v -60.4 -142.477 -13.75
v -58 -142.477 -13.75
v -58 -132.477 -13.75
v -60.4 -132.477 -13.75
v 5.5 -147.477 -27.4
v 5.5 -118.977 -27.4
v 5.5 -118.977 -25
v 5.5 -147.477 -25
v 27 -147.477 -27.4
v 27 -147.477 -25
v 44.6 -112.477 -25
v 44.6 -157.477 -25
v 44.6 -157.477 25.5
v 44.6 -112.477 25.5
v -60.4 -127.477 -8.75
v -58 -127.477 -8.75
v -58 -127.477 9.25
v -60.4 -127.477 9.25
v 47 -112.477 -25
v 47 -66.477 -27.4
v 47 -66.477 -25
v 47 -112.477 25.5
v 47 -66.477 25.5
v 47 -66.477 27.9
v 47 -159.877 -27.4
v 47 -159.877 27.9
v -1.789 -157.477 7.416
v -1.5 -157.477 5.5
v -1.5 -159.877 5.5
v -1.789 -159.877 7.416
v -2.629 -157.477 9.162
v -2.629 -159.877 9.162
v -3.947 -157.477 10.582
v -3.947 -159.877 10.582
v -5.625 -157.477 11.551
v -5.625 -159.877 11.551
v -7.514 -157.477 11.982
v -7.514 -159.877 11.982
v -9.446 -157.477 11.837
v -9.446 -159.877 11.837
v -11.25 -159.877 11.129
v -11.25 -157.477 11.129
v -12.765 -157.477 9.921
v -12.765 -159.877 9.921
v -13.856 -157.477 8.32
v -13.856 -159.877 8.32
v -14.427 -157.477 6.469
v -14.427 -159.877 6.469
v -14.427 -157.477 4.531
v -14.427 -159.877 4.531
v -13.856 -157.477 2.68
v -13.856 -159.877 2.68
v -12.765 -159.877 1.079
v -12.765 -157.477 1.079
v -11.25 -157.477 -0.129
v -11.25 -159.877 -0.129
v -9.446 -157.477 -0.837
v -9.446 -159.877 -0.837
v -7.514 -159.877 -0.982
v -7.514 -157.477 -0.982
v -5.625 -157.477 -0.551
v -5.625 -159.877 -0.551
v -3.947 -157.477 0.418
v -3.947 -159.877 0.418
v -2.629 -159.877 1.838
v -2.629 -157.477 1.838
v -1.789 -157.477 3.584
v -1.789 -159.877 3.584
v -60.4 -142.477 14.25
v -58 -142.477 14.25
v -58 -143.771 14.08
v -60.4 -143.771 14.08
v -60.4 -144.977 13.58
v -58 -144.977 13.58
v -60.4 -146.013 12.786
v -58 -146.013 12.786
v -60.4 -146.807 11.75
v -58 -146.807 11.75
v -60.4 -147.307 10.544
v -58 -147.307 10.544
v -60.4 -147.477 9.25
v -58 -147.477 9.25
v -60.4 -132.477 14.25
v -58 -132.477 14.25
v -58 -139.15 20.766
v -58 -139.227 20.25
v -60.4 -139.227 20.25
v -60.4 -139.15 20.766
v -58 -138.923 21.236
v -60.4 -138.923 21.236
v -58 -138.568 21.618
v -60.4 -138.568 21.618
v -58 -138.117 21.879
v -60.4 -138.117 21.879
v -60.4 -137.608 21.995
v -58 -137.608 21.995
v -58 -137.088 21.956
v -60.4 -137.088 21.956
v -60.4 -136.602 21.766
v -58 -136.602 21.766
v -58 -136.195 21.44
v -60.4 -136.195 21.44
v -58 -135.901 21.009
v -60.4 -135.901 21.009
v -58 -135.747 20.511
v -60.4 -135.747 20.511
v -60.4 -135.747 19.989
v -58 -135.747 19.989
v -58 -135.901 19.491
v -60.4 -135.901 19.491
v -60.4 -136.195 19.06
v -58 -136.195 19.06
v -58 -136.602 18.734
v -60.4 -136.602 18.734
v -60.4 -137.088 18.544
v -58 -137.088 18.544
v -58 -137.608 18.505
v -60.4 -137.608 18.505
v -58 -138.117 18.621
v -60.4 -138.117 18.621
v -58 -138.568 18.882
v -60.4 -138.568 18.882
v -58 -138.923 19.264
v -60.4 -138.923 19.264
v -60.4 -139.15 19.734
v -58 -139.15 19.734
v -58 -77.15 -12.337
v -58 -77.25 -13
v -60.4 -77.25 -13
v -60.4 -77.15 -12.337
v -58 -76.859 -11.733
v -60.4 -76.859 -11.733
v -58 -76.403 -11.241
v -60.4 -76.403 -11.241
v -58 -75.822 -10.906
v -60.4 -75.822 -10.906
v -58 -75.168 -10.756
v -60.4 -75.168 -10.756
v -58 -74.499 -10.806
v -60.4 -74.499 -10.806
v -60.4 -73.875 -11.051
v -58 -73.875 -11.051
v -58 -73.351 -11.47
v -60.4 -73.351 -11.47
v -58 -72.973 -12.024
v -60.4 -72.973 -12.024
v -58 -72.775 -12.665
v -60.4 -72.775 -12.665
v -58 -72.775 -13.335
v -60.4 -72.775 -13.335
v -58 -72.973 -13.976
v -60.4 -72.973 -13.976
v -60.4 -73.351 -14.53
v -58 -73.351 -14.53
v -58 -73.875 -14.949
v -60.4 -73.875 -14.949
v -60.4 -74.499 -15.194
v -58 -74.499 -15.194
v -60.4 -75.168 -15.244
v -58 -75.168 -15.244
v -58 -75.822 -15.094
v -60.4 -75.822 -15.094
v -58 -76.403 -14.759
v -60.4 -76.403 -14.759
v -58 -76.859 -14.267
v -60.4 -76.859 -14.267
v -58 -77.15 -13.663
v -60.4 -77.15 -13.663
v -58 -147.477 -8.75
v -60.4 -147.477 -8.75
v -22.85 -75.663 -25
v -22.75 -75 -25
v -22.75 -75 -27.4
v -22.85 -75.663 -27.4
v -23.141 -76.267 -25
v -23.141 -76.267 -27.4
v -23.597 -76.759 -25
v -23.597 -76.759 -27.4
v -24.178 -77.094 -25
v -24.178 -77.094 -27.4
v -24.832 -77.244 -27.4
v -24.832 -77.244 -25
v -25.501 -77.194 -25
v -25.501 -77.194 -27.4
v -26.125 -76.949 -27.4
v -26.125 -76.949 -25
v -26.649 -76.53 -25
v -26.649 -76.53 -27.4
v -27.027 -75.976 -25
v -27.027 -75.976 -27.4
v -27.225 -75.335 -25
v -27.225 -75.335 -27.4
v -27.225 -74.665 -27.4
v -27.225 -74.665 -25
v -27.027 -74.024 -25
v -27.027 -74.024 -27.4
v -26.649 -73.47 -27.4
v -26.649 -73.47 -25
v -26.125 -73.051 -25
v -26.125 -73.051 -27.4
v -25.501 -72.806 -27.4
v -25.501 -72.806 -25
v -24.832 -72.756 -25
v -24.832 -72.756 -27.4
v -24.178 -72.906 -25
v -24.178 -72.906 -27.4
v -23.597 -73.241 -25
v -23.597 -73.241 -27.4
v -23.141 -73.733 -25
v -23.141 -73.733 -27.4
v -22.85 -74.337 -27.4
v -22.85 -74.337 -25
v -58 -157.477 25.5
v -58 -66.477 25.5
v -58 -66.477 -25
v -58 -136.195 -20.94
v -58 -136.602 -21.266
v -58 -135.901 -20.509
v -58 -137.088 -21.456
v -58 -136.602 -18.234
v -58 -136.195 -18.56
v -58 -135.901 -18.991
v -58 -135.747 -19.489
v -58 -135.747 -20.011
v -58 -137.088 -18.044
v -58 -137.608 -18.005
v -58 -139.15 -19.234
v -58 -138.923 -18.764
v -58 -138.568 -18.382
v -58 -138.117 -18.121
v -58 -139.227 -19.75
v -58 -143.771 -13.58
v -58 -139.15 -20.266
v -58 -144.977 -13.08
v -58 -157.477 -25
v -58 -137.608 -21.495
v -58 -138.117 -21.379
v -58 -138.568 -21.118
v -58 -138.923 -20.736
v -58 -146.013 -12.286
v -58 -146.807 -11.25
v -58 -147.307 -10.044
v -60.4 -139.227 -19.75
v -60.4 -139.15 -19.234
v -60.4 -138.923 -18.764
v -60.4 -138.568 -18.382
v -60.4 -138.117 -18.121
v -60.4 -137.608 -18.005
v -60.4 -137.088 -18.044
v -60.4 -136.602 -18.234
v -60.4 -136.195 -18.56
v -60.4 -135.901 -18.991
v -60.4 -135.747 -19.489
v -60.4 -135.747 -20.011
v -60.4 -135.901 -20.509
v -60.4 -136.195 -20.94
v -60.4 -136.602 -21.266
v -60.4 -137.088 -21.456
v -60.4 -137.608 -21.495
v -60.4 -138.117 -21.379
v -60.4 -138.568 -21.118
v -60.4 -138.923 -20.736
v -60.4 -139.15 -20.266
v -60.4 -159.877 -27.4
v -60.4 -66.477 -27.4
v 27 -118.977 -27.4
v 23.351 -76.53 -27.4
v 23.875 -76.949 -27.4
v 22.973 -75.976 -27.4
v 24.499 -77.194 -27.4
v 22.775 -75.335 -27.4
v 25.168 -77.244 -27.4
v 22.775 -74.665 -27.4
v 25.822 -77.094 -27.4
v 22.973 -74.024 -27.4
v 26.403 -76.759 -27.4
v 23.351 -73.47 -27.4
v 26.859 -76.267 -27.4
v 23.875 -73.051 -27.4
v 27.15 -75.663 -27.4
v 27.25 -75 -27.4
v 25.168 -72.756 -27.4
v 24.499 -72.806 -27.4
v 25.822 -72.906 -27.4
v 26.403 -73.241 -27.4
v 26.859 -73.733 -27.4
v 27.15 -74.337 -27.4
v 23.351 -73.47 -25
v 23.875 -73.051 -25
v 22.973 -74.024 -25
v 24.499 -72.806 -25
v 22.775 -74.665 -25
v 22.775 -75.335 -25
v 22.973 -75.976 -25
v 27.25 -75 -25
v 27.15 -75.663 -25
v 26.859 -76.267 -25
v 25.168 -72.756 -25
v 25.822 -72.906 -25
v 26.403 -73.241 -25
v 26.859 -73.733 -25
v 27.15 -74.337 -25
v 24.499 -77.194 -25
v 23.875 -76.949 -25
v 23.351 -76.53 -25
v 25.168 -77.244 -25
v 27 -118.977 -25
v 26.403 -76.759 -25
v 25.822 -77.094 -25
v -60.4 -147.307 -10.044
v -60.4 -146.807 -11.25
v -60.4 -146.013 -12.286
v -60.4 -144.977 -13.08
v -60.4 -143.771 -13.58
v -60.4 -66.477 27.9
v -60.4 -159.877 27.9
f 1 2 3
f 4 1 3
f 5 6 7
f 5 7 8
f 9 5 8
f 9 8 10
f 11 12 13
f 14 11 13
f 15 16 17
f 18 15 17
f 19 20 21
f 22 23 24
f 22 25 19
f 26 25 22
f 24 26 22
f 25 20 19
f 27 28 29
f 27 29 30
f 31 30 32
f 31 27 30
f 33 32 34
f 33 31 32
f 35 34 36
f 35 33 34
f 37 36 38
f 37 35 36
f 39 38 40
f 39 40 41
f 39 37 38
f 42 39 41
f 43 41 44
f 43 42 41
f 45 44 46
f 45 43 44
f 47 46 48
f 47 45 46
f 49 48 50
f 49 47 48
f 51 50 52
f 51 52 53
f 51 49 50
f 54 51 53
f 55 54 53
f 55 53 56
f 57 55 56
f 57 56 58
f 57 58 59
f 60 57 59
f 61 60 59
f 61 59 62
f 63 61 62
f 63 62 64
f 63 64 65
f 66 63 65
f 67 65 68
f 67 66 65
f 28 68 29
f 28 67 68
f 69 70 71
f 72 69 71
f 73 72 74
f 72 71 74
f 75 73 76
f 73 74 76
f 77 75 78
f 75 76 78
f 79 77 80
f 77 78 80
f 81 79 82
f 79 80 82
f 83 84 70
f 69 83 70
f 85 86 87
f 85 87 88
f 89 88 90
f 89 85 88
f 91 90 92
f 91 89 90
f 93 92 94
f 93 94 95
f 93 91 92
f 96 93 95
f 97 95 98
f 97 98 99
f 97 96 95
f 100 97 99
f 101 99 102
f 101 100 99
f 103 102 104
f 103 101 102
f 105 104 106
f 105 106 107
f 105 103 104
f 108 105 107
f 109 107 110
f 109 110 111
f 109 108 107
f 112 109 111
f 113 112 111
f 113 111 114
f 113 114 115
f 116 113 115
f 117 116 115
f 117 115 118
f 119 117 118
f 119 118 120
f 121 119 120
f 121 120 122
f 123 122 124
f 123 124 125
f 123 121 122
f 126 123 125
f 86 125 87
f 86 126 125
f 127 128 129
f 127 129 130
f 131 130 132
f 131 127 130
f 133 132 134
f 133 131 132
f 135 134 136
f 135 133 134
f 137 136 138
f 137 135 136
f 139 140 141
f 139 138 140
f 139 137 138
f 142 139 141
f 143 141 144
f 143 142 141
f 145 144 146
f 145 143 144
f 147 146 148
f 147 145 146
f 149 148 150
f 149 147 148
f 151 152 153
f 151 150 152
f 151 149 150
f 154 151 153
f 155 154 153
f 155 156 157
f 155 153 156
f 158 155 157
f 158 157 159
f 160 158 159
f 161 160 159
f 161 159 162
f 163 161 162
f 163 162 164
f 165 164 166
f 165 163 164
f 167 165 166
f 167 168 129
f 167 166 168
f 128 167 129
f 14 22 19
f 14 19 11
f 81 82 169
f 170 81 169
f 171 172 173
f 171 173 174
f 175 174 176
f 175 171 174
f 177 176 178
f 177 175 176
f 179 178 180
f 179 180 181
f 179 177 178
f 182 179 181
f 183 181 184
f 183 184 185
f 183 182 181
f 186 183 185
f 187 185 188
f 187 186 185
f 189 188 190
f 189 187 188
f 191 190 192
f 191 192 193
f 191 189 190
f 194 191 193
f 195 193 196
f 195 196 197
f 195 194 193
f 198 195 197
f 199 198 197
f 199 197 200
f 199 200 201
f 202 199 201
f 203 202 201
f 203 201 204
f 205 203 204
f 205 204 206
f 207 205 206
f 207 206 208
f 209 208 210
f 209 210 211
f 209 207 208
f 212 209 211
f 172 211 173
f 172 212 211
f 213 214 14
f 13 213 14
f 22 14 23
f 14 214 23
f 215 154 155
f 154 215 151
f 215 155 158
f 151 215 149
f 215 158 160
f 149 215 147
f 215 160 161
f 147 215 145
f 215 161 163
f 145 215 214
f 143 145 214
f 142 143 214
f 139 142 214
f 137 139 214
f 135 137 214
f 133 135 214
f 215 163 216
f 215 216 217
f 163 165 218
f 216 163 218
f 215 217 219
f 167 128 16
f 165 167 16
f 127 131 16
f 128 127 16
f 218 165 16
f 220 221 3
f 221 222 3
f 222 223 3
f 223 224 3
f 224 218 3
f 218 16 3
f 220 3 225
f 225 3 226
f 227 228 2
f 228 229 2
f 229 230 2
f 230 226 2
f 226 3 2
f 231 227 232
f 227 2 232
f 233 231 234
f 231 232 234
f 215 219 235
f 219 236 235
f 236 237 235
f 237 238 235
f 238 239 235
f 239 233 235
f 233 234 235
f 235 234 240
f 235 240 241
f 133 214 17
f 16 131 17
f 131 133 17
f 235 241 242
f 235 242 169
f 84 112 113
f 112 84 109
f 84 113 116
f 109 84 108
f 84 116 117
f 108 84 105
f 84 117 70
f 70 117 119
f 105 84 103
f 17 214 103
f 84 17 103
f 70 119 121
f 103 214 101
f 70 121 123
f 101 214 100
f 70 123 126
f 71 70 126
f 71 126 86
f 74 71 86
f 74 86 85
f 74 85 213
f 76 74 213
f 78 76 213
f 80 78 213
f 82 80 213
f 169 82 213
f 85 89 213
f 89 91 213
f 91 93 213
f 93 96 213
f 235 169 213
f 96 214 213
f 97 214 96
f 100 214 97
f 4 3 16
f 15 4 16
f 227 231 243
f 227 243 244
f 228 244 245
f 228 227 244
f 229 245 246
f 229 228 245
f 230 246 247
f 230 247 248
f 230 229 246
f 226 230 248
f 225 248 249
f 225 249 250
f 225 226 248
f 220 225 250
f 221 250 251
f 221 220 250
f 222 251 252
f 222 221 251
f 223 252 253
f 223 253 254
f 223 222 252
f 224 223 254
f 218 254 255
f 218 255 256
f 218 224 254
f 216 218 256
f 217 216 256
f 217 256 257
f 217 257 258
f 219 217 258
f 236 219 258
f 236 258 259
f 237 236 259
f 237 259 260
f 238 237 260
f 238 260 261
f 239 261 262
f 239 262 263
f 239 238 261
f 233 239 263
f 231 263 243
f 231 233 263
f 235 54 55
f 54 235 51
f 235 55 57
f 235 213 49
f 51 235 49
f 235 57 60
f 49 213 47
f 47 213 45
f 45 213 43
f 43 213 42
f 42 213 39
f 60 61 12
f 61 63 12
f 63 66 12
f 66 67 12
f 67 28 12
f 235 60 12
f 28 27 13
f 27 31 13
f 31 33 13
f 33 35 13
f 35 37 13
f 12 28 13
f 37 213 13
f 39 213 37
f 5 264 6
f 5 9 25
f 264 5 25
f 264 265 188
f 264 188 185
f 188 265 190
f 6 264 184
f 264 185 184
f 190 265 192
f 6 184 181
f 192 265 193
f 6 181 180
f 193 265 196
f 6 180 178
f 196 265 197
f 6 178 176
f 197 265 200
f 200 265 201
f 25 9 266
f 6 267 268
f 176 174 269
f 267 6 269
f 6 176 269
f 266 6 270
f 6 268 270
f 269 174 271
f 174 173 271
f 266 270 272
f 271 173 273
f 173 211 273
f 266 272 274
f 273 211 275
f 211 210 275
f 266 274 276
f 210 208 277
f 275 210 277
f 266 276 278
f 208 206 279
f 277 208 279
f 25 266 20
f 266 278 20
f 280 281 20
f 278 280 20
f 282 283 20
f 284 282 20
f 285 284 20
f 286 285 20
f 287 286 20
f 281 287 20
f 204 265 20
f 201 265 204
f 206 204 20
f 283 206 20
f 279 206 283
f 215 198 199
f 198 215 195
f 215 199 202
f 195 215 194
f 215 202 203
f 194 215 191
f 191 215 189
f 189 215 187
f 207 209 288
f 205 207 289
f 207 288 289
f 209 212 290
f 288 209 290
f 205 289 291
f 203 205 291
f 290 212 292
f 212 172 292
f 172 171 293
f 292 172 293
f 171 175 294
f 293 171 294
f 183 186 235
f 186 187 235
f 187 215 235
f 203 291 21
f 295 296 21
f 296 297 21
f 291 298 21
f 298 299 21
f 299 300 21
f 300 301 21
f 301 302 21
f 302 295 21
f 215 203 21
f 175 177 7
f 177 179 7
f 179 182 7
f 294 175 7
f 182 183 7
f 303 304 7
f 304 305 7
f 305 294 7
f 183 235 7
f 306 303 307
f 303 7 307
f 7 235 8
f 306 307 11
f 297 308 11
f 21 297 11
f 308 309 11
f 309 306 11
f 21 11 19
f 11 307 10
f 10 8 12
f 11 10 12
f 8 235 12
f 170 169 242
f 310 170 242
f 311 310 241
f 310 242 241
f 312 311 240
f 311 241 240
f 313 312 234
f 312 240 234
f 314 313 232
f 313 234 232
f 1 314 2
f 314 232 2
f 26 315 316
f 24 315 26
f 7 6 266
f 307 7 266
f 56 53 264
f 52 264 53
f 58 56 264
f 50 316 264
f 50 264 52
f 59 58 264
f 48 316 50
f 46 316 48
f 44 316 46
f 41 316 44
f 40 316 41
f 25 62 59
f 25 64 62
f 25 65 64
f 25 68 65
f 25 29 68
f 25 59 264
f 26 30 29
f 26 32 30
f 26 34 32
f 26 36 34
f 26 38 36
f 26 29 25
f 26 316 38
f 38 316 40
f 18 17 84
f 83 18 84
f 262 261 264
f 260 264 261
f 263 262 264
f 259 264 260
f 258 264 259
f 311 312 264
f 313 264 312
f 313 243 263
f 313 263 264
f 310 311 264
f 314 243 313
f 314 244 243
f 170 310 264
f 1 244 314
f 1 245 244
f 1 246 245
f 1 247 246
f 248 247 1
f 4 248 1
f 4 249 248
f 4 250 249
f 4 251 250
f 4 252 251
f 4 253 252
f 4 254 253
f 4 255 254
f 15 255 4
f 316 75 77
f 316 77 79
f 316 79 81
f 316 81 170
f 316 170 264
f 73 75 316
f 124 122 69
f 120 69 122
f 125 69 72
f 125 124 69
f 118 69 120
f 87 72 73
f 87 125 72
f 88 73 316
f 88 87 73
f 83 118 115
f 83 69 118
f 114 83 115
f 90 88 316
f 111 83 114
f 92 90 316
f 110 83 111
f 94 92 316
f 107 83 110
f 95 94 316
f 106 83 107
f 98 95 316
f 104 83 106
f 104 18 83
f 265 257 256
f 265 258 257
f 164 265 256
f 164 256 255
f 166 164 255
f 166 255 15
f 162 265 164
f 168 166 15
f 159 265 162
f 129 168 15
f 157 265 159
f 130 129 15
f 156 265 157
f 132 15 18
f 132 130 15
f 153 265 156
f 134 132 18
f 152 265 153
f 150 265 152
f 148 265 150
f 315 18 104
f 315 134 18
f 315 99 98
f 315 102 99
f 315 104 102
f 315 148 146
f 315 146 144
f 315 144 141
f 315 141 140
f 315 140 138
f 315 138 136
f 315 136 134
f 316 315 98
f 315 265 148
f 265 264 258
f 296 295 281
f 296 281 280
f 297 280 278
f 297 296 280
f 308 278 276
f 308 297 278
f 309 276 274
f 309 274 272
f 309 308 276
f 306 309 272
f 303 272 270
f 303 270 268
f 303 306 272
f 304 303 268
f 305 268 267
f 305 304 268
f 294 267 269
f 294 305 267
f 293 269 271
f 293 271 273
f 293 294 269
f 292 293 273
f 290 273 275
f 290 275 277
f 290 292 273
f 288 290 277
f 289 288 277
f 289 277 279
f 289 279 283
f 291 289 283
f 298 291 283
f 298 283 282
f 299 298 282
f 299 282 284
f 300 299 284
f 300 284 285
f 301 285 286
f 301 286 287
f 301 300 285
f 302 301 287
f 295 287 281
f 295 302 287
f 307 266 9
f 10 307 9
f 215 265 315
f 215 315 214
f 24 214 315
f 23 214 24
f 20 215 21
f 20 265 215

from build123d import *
from build123d import SkipClean  # not in build123d's __all__

# Parameters (mm, degrees)
F0_W             = 57.5
F0_H             = 50
F1_DEPTH         = 107.5
F2_W             = 55.8
F2_H             = 19
F3_DEPTH         = 42
F4_W             = 0.3
F4_H             = 19
F5_DEPTH         = 48.3
F6_T1_DEPTH      = 65.5
F6_T3_DEPTH      = 67.5
F6_T5_DEPTH      = 225
F6_T7_DEPTH      = 11.7
F6_T9_DEPTH      = 11.7
F6_T11_DEPTH     = 204
F8_W             = 87
F8_H             = 15.3
F9_DEPTH         = 14
F10_W            = 8.2
F10_H            = 14
F11_DEPTH        = 7.4
F12_R            = 2
F13_R            = 2.5
F14_DEPTH        = 4
F15_R            = 1
F19_D            = 3.3
F19_DEPTH        = 5
F19_TIP          = 0.9914200214
F19_ON_F18_D     = 3.3
F19_ON_F18_DEPTH = 5
F19_ON_F18_TIP   = 0.9914200214
F19_ON_F17_D     = 3.3
F19_ON_F17_DEPTH = 5
F19_ON_F17_TIP   = 0.9914200214
F20_W            = 264
F20_H            = 50
F20_R            = 1.5
F21_DEPTH        = 6
F22_W            = 122
F22_H            = 91
F22_R            = 2.25
F23_DEPTH        = 2.4
F24_W            = 91
F24_H            = 52.9
F24_R            = 1.75
F25_DEPTH        = 2.4
F26_R            = 2.25
F27_DEPTH        = 25
F28_W            = 91
F28_H            = 52.9
F29_DEPTH        = 3
F30_R            = 1.75
F31_DEPTH        = 25
F32_W            = 127.4
F32_H            = 91
F33_DEPTH        = 2.4
F34_W            = 127.4
F34_H            = 55.3
F34_R            = 6.5
F35_DEPTH        = 2.4
F36_W            = 21.5
F36_H            = 28.5
F37_DEPTH        = 25
F38_W            = 20
F38_H            = 100
F39_DEPTH        = 60
F43_W            = 2.4
F43_H            = 50.5
F44_DEPTH        = 45


# Not quite as in the source:
# - a fillet or chamfer that OpenCascade refuses, or shapes differently, is made with other operations: its cross-section is extruded or revolved along the edge and cut away or added


with BuildPart() as f1:
    # F0 (on Front) → F1 (new body, symmetric)
    with BuildSketch(Plane.XZ):
        with Locations((-28.75, 0)):
            Rectangle(F0_W, F0_H)
    extrude(amount=F1_DEPTH, both=True)

    # F2 (on face) → F3 (cut)
    with BuildSketch(Plane.XY.offset(25)):
        with Locations((-27.9, -98)):
            Rectangle(F2_W, F2_H)
    extrude(amount=-F3_DEPTH, mode=Mode.SUBTRACT)

    # F4 (on face) → F5 (cut)
    with BuildSketch(Plane.XY.offset(25)):
        Polygon((-55.8, 107.5), (-55.8, -88.5), (-55.5, -88.5), (-55.5, 105.5), (0, 105.5), (0, 105.8), (-55.5, 105.8), (-55.5, 107.5), align=None)
        with Locations((-55.65, -98)):
            Rectangle(F4_W, F4_H)
    extrude(amount=-F5_DEPTH, mode=Mode.SUBTRACT)

    # F6: fillet of radius 2 on 9 edges, made by hand

    # F6_s2 → F6_t1 (cut)
    with BuildSketch(Plane.YZ.offset(-60.5)):
        with BuildLine():
            ThreePointArc((-86.5, 25), (-87.9142135624, 24.4142135624), (-88.5, 23))
            Line((-88.5, 23), (-88.5, 25))
            Line((-88.5, 25), (-86.5, 25))
        make_face()
        with BuildLine():
            ThreePointArc((103.5, 25), (104.9142135624, 24.4142135624), (105.5, 23))
            Line((105.5, 23), (105.5, 25))
            Line((105.5, 25), (103.5, 25))
        make_face()
    extrude(amount=F6_T1_DEPTH, mode=Mode.SUBTRACT)

    # F6_s4 → F6_t3 (cut)
    with BuildSketch(Plane.YZ.offset(-62.5)):
        with BuildLine():
            ThreePointArc((-105.5, -25), (-106.9142135624, -24.4142135624), (-107.5, -23))
            Line((-107.5, -23), (-107.5, -25))
            Line((-107.5, -25), (-105.5, -25))
        make_face()
        with BuildLine():
            ThreePointArc((105.5, -25), (106.9142135624, -24.4142135624), (107.5, -23))
            Line((107.5, -23), (107.5, -25))
            Line((107.5, -25), (105.5, -25))
        make_face()
    extrude(amount=F6_T3_DEPTH, mode=Mode.SUBTRACT)

    # F6_s6 → F6_t5 (cut)
    with BuildSketch(Plane.XZ.offset(-112.5)):
        with BuildLine():
            ThreePointArc((-55.5, -25), (-56.9142135624, -24.4142135624), (-57.5, -23))
            Line((-57.5, -23), (-57.5, -25))
            Line((-57.5, -25), (-55.5, -25))
        make_face()
    extrude(amount=F6_T5_DEPTH, mode=Mode.SUBTRACT)

    # F6_s8 → F6_t7 (cut)
    with BuildSketch(Plane.YZ.offset(-62.5)):
        with BuildLine():
            ThreePointArc((-105.5, 25), (-106.9142135624, 24.4142135624), (-107.5, 23))
            Line((-107.5, 23), (-107.5, 25))
            Line((-107.5, 25), (-105.5, 25))
        make_face()
        with BuildLine():
            ThreePointArc((105.5, 25), (106.9142135624, 24.4142135624), (107.5, 23))
            Line((107.5, 23), (107.5, 25))
            Line((107.5, 25), (105.5, 25))
        make_face()
    extrude(amount=F6_T7_DEPTH, mode=Mode.SUBTRACT)

    # F6_s10 → F6_t9 (cut)
    with BuildSketch(Plane.XZ.offset(-112.5)):
        with BuildLine():
            ThreePointArc((-55.5, 23), (-54.9142135624, 24.4142135624), (-53.5, 25))
            Line((-53.5, 25), (-55.5, 25))
            Line((-55.5, 25), (-55.5, 23))
        make_face()
    extrude(amount=F6_T9_DEPTH, mode=Mode.SUBTRACT)

    # F6_s12 → F6_t11 (cut)
    with BuildSketch(Plane.XZ.offset(-110.5)):
        with BuildLine():
            ThreePointArc((-53.5, 25), (-54.9142135624, 24.4142135624), (-55.5, 23))
            Line((-55.5, 23), (-55.5, 25))
            Line((-55.5, 25), (-53.5, 25))
        make_face()
    with SkipClean():  # cleaning this boolean's faces spoils the solid; the shape is the same uncleaned
        extrude(amount=F6_T11_DEPTH, mode=Mode.SUBTRACT)

    # F7: F1 across plane


with BuildPart() as f1_1:
    add(f1.part, clean=False)
    add(f1.part.mirror(Plane.YZ), clean=False)

    # F19
    with Locations(Plane(origin=(-57.5, 0, 0), x_dir=(0, -1, 0), z_dir=(-1, 0, 0))):
        with Locations((-75, -13), (75, -13)):
            Hole(F19_D / 2, depth=F19_DEPTH)
            with Locations((0, 0, -(F19_DEPTH + F19_TIP / 2))):  # 118° drill point
                Cone(0, F19_D / 2, F19_TIP, mode=Mode.SUBTRACT)

    # F19 on F18
    with Locations(Plane(origin=(0, 0, -25), x_dir=(1, 0, 0), z_dir=(0, 0, -1))):
        with Locations((-25, -75), (-25, 75), (25, -75), (25, 75)):
            Hole(F19_ON_F18_D / 2, depth=F19_ON_F18_DEPTH)
            with Locations((0, 0, -(F19_ON_F18_DEPTH + F19_ON_F18_TIP / 2))):  # 118° drill point
                Cone(0, F19_ON_F18_D / 2, F19_ON_F18_TIP, mode=Mode.SUBTRACT)

    # F19 on F17
    with Locations(Plane.YZ.offset(57.5)):
        with Locations((-75, -13), (-75, 12), (75, 12), (75, -13)):
            Hole(F19_ON_F17_D / 2, depth=F19_ON_F17_DEPTH)
            with Locations((0, 0, -(F19_ON_F17_DEPTH + F19_ON_F17_TIP / 2))):  # 118° drill point
                Cone(0, F19_ON_F17_D / 2, F19_ON_F17_TIP, mode=Mode.SUBTRACT)


with BuildPart() as f9:
    # F8 (on face) → F9 (new body)
    with BuildSketch(Plane.XY.offset(-17)):
        with Locations((9.3, -96.15)):
            Rectangle(F8_W, F8_H)
    extrude(amount=F9_DEPTH)

    # F10 (on face) → F11 (cut)
    with BuildSketch(Plane.XY.offset(-3)):
        with Locations((-28.7, -96.8)):
            Rectangle(F10_W, F10_H)
        with Locations((-19.2, -96.8)):
            Rectangle(F10_W, F10_H)
        with Locations((-9.7, -96.8)):
            Rectangle(F10_W, F10_H)
        with Locations((-0.2, -96.8)):
            Rectangle(F10_W, F10_H)
        with Locations((9.3, -96.8)):
            Rectangle(F10_W, F10_H)
        with Locations((18.8, -96.8)):
            Rectangle(F10_W, F10_H)
        with Locations((28.3, -96.8)):
            Rectangle(F10_W, F10_H)
        with Locations((37.8, -96.8)):
            Rectangle(F10_W, F10_H)
        with Locations((47.3, -96.8)):
            Rectangle(F10_W, F10_H)
    extrude(amount=-F11_DEPTH, mode=Mode.SUBTRACT)

    # F12
    f12_edges = [f9.edges().sort_by_distance(p)[0] for p in [
        (-33.5, -103.8, -3),
        (-23.95, -103.8, -3),
        (-14.45, -103.8, -3),
        (-4.95, -103.8, -3),
        (4.55, -103.8, -3),
        (14.05, -103.8, -3),
        (23.55, -103.8, -3),
        (33.05, -103.8, -3),
        (42.55, -103.8, -3),
        (52.1, -103.8, -3),
    ]]
    fillet(f12_edges, radius=F12_R)

    # F13 (on face) → F14 (join)
    with BuildSketch(Plane.XY.offset(-10.4)):
        with Locations((-28.7, -96.8)):
            Circle(F13_R)
        with Locations((-19.2, -96.8)):
            Circle(F13_R)
        with Locations((-9.7, -96.8)):
            Circle(F13_R)
        with Locations((-0.2, -96.8)):
            Circle(F13_R)
        with Locations((9.3, -96.8)):
            Circle(F13_R)
        with Locations((18.8, -96.8)):
            Circle(F13_R)
        with Locations((28.3, -96.8)):
            Circle(F13_R)
        with Locations((37.8, -96.8)):
            Circle(F13_R)
        with Locations((47.3, -96.8)):
            Circle(F13_R)
    extrude(amount=F14_DEPTH)

    # F15
    f15_edges = [f9.edges().sort_by_distance(p)[0] for p in [
        (-31.2, -96.8, -6.4),
        (-21.7, -96.8, -6.4),
        (-12.2, -96.8, -6.4),
        (-2.7, -96.8, -6.4),
        (6.8, -96.8, -6.4),
        (16.3, -96.8, -6.4),
        (25.8, -96.8, -6.4),
        (35.3, -96.8, -6.4),
        (44.8, -96.8, -6.4),
    ]]
    fillet(f15_edges, radius=F15_R)


with BuildPart() as f21:
    # F20 (on face) → F21 (new body)
    with BuildSketch(Plane.YZ.offset(57.5)):
        with Locations((-24.5, 0)):
            Rectangle(F20_W, F20_H)
        with Locations((-75, -13)):
            Circle(F20_R, mode=Mode.SUBTRACT)
        with Locations((75, -13)):
            Circle(F20_R, mode=Mode.SUBTRACT)
        with Locations((-75, 12)):
            Circle(F20_R, mode=Mode.SUBTRACT)
        with Locations((75, 12)):
            Circle(F20_R, mode=Mode.SUBTRACT)
    extrude(amount=F21_DEPTH)


with BuildPart() as f23:
    # F22 (on face) → F23 (new body)
    with BuildSketch(Plane(origin=(0, 0, -25), x_dir=(1, 0, 0), z_dir=(0, 0, -1))):
        with Locations((3, 111.9773719933)):
            Rectangle(F22_W, F22_H)
        with Locations((-25, 75)):
            Circle(F22_R, mode=Mode.SUBTRACT)
        with Locations((25, 75)):
            Circle(F22_R, mode=Mode.SUBTRACT)
    extrude(amount=F23_DEPTH)

    # F24 (on face) → F25 (join)
    with BuildSketch(Plane(origin=(-58, 0, 0), x_dir=(0, -1, 0), z_dir=(-1, 0, 0))):
        with Locations((111.9773719933, -0.95)):
            Rectangle(F24_W, F24_H)
        with Locations((137.4773719933, -19.75)):
            Circle(F24_R, mode=Mode.SUBTRACT)
        with BuildLine():
            Line((127.4773719933, 9.25), (132.4773719933, 14.25))
            Line((132.4773719933, 14.25), (142.4773719933, 14.25))
            ThreePointArc((142.4773719933, 14.25), (146.0129058993, 12.7855339059), (147.4773719933, 9.25))
            Line((147.4773719933, 9.25), (147.4773719933, -8.75))
            ThreePointArc((147.4773719933, -8.75), (146.0129058993, -12.2855339059), (142.4773719933, -13.75))
            Line((142.4773719933, -13.75), (132.4773719933, -13.75))
            Line((132.4773719933, -13.75), (127.4773719933, -8.75))
            Line((127.4773719933, -8.75), (127.4773719933, 9.25))
        make_face(mode=Mode.SUBTRACT)
        with Locations((137.4773719933, 20.25)):
            Circle(F24_R, mode=Mode.SUBTRACT)
    extrude(amount=F25_DEPTH)

    # F26 (on face) → F27 (cut)
    with BuildSketch(Plane(origin=(-57.5, 0, 0), x_dir=(0, -1, 0), z_dir=(-1, 0, 0))):
        with Locations((75, -13)):
            Circle(F26_R)
    extrude(amount=F27_DEPTH, mode=Mode.SUBTRACT)

    # F28 (on face) → F29 (join)
    with BuildSketch(Plane.YZ.offset(64)):
        with Locations((-111.9773719933, -0.95)):
            Rectangle(F28_W, F28_H)
    extrude(amount=F29_DEPTH)

    # F30 (on face) → F31 (cut)
    with BuildSketch(Plane.YZ.offset(63.5)):
        with Locations((-75, 12)):
            Circle(F30_R)
        with Locations((-75, -13)):
            Circle(F30_R)
    extrude(amount=F31_DEPTH, mode=Mode.SUBTRACT)

    # F32 (on face) → F33 (join)
    with BuildSketch(Plane.XY.offset(25.5)):
        with Locations((3.3, -111.9773719933)):
            Rectangle(F32_W, F32_H)
    extrude(amount=F33_DEPTH)

    # F34 (on face) → F35 (join)
    with BuildSketch(Plane.XZ.offset(157.4773719933)):
        with Locations((3.3, 0.25)):
            Rectangle(F34_W, F34_H)
        with Locations((-8, 5.5)):
            Circle(F34_R, mode=Mode.SUBTRACT)
    extrude(amount=F35_DEPTH)

    # F36 (on face) → F37 (cut)
    with BuildSketch(Plane(origin=(0, 0, -27.4), x_dir=(1, 0, 0), z_dir=(0, 0, -1))):
        with Locations((16.25, 133.2273719933)):
            Rectangle(F36_W, F36_H)
    extrude(amount=-F37_DEPTH, mode=Mode.SUBTRACT)


with BuildPart() as f39_tool:
    # F38 (on face) → F39 (new body)
    with BuildSketch(Plane.XY.offset(27.9)):
        with Locations((57, -109.8773719933)):
            Rectangle(F38_W, F38_H)
    extrude(amount=-F39_DEPTH)


with BuildPart() as f1_2:
    add(f1_1.part, clean=False)

    # F39: cut by f39_tool
    add(f39_tool.part, mode=Mode.SUBTRACT)


with BuildPart() as f9_1:
    add(f9.part, clean=False)

    # F39: cut by f39_tool
    add(f39_tool.part, mode=Mode.SUBTRACT)


with BuildPart() as f21_1:
    add(f21.part, clean=False)

    # F39: cut by f39_tool
    add(f39_tool.part, mode=Mode.SUBTRACT)


with BuildPart() as f23_1:
    add(f23.part, clean=False)

    # F39: cut by f39_tool
    add(f39_tool.part, mode=Mode.SUBTRACT)

    # F43 (on face) → F44 (join)
    with BuildSketch(Plane(origin=(0, -157.4773719933, 0), x_dir=(-1, 0, 0), z_dir=(0, 1, 0))):
        with Locations((-45.8, 0.25)):
            Rectangle(F43_W, F43_H)
    extrude(amount=F44_DEPTH)


solid = f23_1.part
